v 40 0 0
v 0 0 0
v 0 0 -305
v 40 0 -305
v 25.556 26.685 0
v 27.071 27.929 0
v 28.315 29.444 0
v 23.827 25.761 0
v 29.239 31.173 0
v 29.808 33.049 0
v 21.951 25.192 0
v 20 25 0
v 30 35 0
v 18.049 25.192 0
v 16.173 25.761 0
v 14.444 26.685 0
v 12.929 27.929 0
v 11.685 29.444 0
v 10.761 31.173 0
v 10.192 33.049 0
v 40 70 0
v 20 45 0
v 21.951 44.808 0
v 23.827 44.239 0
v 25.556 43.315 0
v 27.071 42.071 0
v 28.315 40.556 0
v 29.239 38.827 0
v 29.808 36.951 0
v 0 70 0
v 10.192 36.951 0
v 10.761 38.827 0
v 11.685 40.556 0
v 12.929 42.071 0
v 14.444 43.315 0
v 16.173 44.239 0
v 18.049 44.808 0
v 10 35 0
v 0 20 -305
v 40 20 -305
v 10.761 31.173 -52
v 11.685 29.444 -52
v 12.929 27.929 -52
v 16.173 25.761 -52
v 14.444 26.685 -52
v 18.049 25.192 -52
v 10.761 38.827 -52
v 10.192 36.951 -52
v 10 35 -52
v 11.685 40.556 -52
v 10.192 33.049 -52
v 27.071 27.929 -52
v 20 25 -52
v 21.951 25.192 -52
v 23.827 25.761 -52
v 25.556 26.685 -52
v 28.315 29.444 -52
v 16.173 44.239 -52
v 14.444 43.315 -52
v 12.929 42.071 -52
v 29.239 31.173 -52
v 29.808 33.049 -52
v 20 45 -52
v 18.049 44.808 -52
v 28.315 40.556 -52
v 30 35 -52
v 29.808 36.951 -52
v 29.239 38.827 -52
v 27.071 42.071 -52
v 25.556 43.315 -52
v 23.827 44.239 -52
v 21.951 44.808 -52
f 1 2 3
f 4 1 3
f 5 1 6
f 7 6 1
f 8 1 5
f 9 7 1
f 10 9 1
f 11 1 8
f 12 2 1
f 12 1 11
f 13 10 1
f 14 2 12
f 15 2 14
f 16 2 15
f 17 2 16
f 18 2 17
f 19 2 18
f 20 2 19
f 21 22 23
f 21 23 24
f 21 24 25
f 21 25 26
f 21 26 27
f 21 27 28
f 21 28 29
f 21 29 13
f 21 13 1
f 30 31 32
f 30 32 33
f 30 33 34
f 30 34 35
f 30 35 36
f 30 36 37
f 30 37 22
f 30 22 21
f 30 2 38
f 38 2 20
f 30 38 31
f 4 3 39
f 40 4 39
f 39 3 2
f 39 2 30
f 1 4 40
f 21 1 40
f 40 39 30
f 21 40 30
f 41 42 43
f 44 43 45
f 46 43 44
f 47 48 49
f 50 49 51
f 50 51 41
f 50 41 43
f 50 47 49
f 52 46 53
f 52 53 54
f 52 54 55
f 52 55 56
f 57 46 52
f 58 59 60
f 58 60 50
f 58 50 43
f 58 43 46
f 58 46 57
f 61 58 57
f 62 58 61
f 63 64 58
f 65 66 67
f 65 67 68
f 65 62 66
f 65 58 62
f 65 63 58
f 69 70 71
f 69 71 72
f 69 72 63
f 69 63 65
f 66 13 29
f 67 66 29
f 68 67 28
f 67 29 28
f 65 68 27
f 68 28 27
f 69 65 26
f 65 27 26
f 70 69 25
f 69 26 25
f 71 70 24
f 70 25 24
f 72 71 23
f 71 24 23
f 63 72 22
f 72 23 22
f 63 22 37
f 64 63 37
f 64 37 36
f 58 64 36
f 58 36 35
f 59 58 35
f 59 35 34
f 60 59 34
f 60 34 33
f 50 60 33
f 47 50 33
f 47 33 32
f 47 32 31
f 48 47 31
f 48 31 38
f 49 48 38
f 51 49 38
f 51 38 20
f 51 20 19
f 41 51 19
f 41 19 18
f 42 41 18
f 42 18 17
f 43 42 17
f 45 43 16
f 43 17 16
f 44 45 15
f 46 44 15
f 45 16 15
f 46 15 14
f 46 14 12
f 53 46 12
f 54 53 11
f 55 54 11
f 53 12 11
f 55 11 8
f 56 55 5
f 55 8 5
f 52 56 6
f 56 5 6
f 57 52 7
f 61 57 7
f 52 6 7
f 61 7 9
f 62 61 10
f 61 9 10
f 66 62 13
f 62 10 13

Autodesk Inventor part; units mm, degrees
ref_plane "YZ Plane" through (0, 0, 0) normal (1, 0, 0) x (0, 1, 0)
ref_plane "XZ Plane" through (0, 0, 0) normal (0, 1, 0) x (-1, 0, 0)
ref_plane "XY Plane" through (0, 0, 0) normal (0, 0, 1) x (1, 0, 0)
sketch "Sketch2" plane through (0, 0, 0) normal (1, 0, 0) x (0, 1, 0)
  line L0 (0, 0) -> (70, 0)
  line L1 (0, 0) -> (0, -305)
  line L2 (0, -305) -> (20, -305)
  line L3 (20, -305) -> (70, 0)
  dimension "d2" = 70
  dimension "d3" = 305
  dimension "d4" = 20
extrude "Extrusion1" add sketch "Sketch2" along normal blind 40
sketch "Sketch3" plane through (0, 0, 0) normal (0, 0, 1) x (1, 0, 0)
  line L0 (0, 35) -> (40, 35)
  line L1 (0, 0) -> (40, 0) projected
  line L2 (20, 0) -> (20, 70)
  line L3 (0, 70) -> (40, 70) projected
  circle A0 centre (20, 35) radius 10
  dimension "d7" = 35
  dimension "d8" = 20
extrude "Extrusion2" cut sketch "Sketch3" against normal blind 52
properties part number "Car Base" material "Wood (Maple)"
